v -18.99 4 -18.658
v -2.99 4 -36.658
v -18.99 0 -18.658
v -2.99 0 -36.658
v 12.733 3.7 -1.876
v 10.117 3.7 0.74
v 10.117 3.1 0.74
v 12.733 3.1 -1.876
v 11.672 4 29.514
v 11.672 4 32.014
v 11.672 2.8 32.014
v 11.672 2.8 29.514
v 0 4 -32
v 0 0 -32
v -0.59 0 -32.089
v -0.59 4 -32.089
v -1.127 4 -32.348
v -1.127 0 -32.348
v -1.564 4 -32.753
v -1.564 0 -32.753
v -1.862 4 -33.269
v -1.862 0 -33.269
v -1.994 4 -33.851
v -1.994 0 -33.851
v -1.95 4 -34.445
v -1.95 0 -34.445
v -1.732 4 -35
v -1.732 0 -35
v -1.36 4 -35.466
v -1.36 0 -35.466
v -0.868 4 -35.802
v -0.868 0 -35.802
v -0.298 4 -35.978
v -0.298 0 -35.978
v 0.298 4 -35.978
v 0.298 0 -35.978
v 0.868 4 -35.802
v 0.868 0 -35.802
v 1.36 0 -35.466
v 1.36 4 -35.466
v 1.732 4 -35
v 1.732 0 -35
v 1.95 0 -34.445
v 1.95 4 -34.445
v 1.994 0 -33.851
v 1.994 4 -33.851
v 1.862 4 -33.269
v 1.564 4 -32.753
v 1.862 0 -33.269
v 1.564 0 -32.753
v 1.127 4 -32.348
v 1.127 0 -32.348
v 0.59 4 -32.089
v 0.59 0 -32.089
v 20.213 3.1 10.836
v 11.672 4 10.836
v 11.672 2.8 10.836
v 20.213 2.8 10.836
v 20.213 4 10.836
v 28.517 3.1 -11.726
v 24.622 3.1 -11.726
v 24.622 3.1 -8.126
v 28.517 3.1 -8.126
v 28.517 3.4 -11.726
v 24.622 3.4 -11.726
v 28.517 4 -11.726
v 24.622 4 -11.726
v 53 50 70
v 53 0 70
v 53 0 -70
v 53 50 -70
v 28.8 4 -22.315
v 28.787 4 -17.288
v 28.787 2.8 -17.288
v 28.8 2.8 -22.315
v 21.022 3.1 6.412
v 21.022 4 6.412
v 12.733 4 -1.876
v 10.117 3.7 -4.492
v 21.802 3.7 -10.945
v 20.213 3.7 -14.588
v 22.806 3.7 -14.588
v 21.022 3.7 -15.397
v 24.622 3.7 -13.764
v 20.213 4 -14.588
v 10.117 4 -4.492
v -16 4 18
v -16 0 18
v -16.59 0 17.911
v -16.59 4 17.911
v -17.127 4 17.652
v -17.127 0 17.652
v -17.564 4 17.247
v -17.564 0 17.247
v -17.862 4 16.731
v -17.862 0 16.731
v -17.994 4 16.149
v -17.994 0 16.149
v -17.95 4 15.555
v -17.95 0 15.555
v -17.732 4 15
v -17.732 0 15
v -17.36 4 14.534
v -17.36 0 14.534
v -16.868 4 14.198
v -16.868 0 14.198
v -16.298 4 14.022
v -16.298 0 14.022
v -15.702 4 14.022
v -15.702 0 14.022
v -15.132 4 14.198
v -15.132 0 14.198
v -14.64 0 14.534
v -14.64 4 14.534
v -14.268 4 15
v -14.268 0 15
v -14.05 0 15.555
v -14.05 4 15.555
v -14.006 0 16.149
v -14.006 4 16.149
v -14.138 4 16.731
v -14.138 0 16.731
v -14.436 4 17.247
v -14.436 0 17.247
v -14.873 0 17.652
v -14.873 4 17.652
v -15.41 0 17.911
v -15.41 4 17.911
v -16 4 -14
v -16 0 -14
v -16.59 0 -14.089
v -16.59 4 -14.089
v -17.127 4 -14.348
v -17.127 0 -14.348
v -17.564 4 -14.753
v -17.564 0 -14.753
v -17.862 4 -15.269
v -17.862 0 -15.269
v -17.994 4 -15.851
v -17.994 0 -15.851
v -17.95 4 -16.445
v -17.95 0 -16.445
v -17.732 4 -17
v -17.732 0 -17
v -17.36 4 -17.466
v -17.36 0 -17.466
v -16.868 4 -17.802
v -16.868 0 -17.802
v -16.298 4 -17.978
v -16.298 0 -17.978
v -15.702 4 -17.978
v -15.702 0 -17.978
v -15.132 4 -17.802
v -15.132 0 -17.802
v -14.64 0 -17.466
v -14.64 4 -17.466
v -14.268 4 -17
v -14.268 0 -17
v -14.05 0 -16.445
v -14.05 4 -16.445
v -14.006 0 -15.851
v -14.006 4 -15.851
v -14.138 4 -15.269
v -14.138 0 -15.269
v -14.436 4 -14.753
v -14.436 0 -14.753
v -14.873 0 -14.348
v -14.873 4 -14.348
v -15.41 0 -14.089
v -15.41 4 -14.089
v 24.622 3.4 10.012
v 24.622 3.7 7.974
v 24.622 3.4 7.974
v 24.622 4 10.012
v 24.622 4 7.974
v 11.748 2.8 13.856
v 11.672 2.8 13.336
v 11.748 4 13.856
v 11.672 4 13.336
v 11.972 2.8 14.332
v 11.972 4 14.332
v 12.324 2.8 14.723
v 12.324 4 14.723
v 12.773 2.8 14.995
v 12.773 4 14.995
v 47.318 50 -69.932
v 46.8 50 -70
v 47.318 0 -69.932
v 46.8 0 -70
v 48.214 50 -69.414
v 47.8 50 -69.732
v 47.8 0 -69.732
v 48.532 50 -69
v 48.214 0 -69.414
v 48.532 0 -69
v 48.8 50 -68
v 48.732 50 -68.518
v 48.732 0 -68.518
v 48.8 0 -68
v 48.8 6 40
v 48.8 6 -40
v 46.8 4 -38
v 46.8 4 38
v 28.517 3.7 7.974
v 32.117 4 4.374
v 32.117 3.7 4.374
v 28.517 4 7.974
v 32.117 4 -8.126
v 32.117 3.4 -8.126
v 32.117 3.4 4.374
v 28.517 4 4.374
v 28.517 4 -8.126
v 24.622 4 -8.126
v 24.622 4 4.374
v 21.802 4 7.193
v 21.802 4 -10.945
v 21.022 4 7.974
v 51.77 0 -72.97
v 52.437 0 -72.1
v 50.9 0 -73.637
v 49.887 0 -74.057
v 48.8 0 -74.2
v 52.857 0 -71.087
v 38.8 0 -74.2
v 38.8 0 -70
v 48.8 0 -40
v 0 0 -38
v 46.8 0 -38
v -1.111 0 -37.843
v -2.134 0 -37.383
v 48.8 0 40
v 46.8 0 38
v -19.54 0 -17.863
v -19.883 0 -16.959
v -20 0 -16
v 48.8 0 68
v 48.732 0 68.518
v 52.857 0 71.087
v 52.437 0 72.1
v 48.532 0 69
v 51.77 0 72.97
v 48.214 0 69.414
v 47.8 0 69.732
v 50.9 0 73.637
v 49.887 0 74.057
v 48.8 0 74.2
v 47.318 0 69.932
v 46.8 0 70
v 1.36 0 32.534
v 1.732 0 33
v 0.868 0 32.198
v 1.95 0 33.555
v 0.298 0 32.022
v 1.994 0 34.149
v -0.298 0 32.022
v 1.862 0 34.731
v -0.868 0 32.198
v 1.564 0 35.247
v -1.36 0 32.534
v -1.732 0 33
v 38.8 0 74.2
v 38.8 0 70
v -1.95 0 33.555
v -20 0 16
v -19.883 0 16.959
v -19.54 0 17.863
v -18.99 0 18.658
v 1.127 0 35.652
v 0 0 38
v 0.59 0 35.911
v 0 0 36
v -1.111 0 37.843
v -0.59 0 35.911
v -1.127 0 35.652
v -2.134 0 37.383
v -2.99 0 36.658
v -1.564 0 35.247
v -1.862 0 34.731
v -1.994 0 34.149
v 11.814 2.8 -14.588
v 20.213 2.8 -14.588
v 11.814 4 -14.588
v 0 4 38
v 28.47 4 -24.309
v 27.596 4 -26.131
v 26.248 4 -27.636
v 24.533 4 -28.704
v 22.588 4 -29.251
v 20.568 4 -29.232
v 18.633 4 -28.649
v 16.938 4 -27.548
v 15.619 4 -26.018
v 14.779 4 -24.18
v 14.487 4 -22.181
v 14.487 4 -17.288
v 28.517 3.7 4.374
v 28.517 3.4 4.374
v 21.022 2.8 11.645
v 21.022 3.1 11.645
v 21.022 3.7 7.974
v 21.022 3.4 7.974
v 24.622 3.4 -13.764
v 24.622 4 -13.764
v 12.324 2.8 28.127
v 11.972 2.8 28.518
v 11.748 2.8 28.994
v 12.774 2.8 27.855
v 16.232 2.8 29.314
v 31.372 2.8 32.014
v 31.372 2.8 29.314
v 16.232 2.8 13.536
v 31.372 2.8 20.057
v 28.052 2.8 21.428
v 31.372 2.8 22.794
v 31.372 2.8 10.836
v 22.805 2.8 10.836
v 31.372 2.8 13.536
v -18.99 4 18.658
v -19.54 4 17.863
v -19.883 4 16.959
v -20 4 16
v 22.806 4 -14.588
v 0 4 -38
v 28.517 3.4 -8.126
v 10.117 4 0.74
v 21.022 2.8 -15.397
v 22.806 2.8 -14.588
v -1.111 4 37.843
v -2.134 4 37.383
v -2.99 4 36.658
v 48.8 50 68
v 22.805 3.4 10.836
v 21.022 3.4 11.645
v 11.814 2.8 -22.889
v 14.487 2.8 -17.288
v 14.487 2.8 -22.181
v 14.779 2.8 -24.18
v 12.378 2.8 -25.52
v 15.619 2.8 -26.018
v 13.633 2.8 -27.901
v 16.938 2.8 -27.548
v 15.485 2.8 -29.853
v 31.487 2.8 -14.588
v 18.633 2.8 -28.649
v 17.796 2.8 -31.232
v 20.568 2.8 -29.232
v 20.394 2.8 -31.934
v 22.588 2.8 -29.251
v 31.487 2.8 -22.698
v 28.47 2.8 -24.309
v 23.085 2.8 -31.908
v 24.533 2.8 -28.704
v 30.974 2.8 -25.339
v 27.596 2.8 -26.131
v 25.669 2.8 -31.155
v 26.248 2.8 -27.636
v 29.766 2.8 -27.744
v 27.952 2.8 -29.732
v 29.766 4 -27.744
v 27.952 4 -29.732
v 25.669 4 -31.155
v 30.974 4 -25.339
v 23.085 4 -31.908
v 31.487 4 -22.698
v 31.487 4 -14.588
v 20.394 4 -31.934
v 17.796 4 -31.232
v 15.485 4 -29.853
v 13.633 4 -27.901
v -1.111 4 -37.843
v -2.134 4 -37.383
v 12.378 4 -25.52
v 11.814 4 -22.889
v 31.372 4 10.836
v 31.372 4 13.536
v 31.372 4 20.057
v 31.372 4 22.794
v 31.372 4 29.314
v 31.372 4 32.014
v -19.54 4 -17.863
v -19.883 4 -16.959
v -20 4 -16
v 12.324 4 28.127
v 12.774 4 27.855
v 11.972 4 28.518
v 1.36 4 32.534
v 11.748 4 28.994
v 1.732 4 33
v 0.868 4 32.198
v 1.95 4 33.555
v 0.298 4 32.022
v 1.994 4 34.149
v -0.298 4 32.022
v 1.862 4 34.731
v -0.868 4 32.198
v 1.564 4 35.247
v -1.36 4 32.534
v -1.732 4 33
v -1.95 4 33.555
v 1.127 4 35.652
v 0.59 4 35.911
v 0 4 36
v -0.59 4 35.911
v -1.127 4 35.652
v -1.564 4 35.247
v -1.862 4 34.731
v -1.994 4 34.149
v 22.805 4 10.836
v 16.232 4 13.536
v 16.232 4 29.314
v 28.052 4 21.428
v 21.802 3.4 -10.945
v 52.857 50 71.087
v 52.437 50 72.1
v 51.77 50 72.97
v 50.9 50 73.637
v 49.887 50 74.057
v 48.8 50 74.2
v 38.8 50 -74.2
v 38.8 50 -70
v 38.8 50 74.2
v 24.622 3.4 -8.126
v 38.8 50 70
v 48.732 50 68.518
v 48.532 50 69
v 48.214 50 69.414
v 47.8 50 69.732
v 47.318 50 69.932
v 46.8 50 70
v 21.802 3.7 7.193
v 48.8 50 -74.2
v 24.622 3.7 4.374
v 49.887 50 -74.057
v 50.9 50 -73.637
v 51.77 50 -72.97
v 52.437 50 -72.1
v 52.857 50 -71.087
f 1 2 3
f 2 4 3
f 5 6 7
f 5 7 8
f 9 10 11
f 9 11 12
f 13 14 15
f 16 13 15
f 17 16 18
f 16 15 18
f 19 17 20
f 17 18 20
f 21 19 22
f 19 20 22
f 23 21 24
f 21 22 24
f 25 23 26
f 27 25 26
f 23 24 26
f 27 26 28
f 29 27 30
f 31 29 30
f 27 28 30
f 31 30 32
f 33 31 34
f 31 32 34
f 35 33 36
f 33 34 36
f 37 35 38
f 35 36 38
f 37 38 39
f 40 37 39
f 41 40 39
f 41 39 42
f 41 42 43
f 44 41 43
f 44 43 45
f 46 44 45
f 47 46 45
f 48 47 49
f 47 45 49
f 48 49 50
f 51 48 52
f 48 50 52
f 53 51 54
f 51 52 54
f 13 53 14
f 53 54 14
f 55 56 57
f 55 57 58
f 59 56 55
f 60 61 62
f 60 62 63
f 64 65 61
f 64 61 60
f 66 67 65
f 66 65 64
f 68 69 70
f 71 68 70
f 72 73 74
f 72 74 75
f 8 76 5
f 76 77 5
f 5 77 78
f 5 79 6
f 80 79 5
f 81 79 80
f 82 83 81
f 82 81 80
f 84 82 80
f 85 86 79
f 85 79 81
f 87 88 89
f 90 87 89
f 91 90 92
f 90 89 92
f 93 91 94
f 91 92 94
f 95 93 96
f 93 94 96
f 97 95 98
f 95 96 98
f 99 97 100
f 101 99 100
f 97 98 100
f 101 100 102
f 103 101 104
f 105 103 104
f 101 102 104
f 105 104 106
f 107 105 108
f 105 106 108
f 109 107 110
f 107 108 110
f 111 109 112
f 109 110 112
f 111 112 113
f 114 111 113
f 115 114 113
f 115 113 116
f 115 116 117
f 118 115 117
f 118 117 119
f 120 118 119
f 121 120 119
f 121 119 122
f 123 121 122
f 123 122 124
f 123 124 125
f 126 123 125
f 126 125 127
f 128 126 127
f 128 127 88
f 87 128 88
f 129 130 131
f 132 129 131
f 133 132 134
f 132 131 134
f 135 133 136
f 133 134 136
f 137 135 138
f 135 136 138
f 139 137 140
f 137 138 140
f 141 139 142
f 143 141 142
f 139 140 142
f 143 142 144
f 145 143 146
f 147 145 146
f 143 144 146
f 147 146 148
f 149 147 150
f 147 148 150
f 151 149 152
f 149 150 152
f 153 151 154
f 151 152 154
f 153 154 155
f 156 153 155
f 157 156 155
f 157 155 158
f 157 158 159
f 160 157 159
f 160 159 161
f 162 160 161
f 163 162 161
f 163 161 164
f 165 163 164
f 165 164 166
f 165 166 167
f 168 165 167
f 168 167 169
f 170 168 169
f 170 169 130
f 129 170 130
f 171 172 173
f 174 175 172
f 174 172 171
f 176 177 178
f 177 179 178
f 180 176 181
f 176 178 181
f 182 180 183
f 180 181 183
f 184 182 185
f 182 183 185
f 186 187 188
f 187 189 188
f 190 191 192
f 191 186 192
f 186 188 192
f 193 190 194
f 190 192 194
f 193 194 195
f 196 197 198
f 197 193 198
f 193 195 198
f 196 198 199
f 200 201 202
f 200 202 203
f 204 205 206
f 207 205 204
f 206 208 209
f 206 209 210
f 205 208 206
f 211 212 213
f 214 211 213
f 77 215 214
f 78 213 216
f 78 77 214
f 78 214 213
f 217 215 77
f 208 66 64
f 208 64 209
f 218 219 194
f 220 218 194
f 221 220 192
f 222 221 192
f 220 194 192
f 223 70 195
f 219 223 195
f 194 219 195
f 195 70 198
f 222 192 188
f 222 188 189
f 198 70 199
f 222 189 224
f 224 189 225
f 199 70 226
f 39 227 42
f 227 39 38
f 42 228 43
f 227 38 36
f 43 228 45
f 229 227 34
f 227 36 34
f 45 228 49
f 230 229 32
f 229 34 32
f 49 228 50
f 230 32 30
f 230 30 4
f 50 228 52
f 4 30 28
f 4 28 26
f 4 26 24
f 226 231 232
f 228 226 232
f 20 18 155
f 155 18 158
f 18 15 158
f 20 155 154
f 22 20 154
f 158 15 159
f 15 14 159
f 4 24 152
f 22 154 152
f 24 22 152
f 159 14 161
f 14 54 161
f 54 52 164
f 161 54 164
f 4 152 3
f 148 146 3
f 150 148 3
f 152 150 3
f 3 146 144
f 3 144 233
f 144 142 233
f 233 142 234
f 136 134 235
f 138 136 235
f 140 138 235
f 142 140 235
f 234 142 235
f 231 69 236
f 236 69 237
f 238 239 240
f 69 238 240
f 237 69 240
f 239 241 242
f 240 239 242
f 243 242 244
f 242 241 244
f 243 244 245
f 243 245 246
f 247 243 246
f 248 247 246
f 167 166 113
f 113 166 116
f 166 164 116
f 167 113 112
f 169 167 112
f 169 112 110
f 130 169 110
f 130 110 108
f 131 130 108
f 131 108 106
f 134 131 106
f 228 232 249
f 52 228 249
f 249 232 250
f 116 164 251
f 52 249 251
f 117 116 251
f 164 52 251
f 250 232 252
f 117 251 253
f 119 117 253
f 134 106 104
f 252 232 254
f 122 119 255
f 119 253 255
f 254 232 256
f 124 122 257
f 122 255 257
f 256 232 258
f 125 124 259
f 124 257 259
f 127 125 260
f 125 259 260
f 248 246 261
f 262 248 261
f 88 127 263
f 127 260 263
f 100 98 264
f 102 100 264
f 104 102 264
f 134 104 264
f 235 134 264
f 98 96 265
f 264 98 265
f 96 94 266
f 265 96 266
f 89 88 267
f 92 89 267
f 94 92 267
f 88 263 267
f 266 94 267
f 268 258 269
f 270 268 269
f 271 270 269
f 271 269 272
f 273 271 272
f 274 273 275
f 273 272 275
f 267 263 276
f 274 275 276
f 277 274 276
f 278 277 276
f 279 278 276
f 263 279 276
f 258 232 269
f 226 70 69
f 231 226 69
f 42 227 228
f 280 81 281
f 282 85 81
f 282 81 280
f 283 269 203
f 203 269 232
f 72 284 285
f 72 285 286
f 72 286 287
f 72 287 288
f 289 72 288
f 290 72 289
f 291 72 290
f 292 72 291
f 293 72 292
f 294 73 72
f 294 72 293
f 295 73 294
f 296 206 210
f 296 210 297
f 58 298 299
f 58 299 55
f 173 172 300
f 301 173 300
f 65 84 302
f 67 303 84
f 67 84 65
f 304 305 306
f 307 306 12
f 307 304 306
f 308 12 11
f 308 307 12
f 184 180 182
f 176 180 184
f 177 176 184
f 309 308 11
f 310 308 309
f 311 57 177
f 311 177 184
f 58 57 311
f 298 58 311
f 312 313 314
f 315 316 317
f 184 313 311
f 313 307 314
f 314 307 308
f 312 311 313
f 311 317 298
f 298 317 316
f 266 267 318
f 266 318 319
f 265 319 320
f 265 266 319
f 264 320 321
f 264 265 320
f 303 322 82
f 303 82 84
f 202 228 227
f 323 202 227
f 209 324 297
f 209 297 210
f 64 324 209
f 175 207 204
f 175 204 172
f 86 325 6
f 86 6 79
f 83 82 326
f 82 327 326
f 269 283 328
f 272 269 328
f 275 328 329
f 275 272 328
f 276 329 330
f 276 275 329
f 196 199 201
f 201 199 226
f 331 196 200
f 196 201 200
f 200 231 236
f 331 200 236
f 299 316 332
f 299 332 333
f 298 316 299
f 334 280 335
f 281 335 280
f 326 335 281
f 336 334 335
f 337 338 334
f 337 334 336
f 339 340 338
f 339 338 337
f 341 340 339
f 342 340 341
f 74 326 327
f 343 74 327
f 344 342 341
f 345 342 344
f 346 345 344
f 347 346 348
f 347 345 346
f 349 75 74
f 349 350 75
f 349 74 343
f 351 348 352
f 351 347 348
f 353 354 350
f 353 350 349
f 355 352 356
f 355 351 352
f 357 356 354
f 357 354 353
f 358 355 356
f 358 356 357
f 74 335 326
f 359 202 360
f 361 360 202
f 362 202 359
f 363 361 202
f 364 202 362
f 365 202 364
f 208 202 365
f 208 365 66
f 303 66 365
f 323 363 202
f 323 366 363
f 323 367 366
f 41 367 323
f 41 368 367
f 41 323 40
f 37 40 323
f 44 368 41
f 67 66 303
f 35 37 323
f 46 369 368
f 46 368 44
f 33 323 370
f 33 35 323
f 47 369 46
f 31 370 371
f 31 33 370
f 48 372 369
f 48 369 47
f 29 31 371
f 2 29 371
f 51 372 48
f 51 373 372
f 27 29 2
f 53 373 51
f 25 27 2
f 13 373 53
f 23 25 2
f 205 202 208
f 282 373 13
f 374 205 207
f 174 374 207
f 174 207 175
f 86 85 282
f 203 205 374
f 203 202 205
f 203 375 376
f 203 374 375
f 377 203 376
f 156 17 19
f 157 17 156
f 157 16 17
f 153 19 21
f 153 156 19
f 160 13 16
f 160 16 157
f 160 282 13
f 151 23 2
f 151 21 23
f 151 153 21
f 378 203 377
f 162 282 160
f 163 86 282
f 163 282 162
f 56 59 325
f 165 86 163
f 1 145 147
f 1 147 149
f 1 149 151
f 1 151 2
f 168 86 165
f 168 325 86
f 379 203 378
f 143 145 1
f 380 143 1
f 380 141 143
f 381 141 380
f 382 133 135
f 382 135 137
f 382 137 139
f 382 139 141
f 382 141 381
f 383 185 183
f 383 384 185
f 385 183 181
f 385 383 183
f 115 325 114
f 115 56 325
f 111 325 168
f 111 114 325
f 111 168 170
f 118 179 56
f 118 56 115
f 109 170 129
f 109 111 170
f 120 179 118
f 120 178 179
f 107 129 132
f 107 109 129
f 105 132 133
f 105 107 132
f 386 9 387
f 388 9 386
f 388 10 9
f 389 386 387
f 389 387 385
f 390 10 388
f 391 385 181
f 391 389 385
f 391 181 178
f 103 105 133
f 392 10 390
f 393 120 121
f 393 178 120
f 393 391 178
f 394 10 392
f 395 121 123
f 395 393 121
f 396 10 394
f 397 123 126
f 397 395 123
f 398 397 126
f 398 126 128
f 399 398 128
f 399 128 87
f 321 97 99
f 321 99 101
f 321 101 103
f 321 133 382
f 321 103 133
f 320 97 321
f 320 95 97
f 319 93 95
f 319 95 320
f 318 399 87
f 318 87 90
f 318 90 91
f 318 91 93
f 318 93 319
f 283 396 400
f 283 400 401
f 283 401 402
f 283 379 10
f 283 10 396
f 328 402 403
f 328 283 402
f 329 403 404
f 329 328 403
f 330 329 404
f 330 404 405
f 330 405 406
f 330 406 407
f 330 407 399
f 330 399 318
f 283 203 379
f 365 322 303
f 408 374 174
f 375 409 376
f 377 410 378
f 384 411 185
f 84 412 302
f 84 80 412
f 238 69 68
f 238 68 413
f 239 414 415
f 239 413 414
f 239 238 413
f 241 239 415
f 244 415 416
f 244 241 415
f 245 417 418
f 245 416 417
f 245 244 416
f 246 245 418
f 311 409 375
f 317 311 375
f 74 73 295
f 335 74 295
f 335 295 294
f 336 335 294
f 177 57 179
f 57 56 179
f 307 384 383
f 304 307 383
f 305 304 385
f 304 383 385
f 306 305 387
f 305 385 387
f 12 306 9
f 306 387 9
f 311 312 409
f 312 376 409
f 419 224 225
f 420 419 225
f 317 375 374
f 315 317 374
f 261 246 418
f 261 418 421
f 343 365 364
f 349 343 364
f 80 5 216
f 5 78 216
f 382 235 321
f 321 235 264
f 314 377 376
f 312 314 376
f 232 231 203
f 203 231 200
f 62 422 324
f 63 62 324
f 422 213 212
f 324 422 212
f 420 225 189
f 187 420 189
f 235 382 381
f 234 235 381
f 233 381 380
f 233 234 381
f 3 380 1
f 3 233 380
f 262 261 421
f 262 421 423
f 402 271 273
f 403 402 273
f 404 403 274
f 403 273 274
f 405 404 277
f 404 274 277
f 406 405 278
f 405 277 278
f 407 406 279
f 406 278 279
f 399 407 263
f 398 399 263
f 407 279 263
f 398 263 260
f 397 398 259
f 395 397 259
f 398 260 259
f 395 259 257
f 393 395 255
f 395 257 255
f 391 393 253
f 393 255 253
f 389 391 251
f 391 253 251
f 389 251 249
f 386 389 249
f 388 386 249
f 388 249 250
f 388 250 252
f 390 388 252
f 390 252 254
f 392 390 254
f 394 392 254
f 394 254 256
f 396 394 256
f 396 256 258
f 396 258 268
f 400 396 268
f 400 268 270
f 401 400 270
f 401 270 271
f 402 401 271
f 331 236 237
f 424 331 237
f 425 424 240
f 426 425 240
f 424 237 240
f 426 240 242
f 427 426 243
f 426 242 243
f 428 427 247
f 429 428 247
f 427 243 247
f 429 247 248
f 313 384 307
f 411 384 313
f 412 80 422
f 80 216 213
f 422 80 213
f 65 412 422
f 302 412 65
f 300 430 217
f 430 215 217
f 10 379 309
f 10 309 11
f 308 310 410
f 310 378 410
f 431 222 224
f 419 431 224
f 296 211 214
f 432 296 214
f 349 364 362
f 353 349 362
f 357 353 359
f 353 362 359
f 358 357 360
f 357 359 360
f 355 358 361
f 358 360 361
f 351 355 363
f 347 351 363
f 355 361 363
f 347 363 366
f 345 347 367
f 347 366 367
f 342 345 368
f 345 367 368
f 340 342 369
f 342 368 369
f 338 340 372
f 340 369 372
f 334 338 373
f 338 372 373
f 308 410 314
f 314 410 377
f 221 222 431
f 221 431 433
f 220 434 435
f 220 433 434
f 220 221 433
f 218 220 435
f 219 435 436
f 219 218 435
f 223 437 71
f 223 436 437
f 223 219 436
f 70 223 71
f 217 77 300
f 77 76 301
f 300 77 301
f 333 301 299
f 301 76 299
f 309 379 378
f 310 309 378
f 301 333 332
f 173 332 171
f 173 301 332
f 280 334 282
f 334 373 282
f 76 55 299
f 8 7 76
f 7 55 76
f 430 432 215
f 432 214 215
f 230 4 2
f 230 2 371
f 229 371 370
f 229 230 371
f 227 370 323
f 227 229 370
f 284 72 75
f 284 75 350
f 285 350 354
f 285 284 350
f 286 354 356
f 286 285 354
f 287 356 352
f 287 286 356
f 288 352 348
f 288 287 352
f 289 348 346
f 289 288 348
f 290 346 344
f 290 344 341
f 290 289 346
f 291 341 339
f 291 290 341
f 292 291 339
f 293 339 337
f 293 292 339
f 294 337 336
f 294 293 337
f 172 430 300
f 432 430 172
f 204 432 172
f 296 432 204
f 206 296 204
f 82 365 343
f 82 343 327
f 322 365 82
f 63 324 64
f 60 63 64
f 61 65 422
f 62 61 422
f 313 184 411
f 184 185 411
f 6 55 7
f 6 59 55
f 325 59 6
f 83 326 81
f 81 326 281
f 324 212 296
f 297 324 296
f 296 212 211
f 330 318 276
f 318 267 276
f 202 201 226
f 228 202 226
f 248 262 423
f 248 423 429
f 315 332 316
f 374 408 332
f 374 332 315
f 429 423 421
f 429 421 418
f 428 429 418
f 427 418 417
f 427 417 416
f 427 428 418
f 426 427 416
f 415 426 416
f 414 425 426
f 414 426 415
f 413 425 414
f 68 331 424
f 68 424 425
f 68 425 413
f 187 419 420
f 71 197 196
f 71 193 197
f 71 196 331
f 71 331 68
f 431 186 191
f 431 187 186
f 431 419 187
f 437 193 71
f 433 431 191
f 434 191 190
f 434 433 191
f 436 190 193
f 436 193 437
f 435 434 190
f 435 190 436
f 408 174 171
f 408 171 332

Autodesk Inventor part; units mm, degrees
ref_plane "YZ Plane" through (0, 0, 0) normal (1, 0, 0) x (0, 1, 0)
ref_plane "XZ Plane" through (0, 0, 0) normal (0, 1, 0) x (-1, 0, 0)
ref_plane "XY Plane" through (0, 0, 0) normal (0, 0, 1) x (1, 0, 0)
sketch "Sketch1" plane through (0, 0, 0) normal (0, 1, 0) x (-1, 0, 0)
  line L0 (0, 34) -> (16, 16) construction
  line L1 (18.9896, 18.6575) -> (2.9896, 36.6575)
  arc A0 (2.9896, 36.6575) -> (0, 38) centre (0, 34) ccw
  arc A1 (20, 16) -> (18.9896, 18.6575) centre (16, 16) ccw
  line L2 (16, 16) -> (16, -16) construction
  line L3 (20, -16) -> (20, 16)
  line L4 (16, -16) -> (0, -34) construction
  line L5 (2.9896, -36.6575) -> (18.9896, -18.6575)
  line L6 (0, 34) -> (-44.6053, 34) construction
  line L7 (0, 38) -> (-53, 38)
  line L8 (0, -34) -> (-49, -34) construction
  line L9 (-53, -38) -> (0, -38)
  line L10 (-49, 30.0008) -> (-49, -29.9992) construction
  line L11 (-53, 38) -> (-53, -38)
  arc A2 (18.9896, -18.6575) -> (20, -16) centre (16, -16) ccw
  arc A3 (0, -38) -> (2.9896, -36.6575) centre (0, -34) ccw
  point P0 (0, 0)
  point P1 (8, 25)
  point P2 (16, 0)
  point P3 (8, -25)
  point P4 (-24.1053, 34)
  point P5 (-24.5, -34)
  point P6 (-49, 0.0008)
  dimension "d1" = 34
  dimension "d2" = 32
  dimension "d3" = 16
  dimension "d4" = 16
  dimension "d6" = 8
  dimension "d12" = 4
  dimension "d13" = 4
  dimension "d15" = 4
  dimension "d17" = 68
  dimension "d18" = 76
  dimension "d19" = 73
  dimension "d21" = 20
  dimension "d40" = 76
  dimension "d41" = 53
extrude "Extrusion1" add sketch "Sketch1" along normal blind 4
sketch "Sketch2" plane through (0, 4, 0) normal (0, 1, 0) x (1, 0, 0)
  line L0 (-20, 16) -> (-20, -16) projected
  point P0 (0, 0)
  point P1 (0, -34)
  point P2 (-16, 16)
  point P3 (-16, -16)
  point P4 (0, 34)
  dimension "d31" = 34
  dimension "d33" = 20
  dimension "d34" = 16
  dimension "d35" = 4
  dimension "d36" = 16
  dimension "d37" = 4
  dimension "d38" = 20
  dimension "d39" = 34
hole "Hole1" at (0, 4, 34) at (-16, 4, -16) at (-16, 4, 16) at (0, 4, -34) direction (0, -1, 0) diameter 4 end through all
sketch "Sketch3" plane through (0, 4, 0) normal (0, 1, 0) x (1, 0, 0)
  line L0 (53, -70) -> (53, 70)
  line L1 (48.8, 70) -> (48.8, -70)
  line L2 (53, -38) -> (53, 38) projected
  arc A0 (53, 70) -> (48.8, 74.2) centre (48.8, 70) ccw
  arc A1 (48.8, -74.2) -> (53, -70) centre (48.8, -70) ccw
  line L3 (48.8, 74.2) -> (38.8, 74.2)
  line L4 (38.8, 74.2) -> (38.8, 70)
  line L5 (38.8, 70) -> (48.8, 70)
  line L6 (48.8, -74.2) -> (38.8, -74.2)
  line L7 (38.8, -74.2) -> (38.8, -70)
  line L8 (38.8, -70) -> (48.8, -70)
  point P0 (0, 0)
  dimension "d42" = 140
  dimension "d43" = 4.2
  dimension "d52" = 70
  dimension "d53" = 10
  dimension "d54" = 10
extrude "Extrusion2" add sketch "Sketch3" along normal blind 46 and the other way blind 4
chamfer "Chamfer1" distance 2 angle 45 3 edges at (48.8, 4, 0) (48.8, 2, 38) (48.8, 2, -38)
fillet "Fillet1" radius 2 1 edges at (48.8, 25, 70)
fillet "Fillet2" radius 2 1 edges at (48.8, 25, -70)
sketch "Sketch9" plane through (0, 4, 0) normal (0, 1, 0) x (1, 0, 0)
  line L0 (21.0218, -11.6451) -> (10.117, -0.7403)
  line L1 (10.117, -0.7403) -> (10.117, 4.4923)
  line L2 (10.117, 4.4923) -> (21.0218, 15.3971)
  line L3 (21.0218, 15.3971) -> (24.6218, 13.7645)
  line L4 (24.6218, 13.7645) -> (24.6218, 11.726)
  line L5 (24.6218, 11.726) -> (28.517, 11.726)
  line L6 (28.517, 11.726) -> (32.117, 8.126)
  line L7 (32.117, 8.126) -> (32.117, -4.374)
  line L8 (32.117, -4.374) -> (28.517, -7.974)
  line L9 (28.517, -7.974) -> (24.6218, -7.974)
  line L10 (24.6218, -7.974) -> (24.6218, -10.0125)
  line L11 (24.6218, -10.0125) -> (21.0218, -11.6451)
  line L12 (28.517, -4.374) -> (24.6218, -4.374)
  line L13 (24.6218, -4.374) -> (21.8025, -7.1932)
  line L14 (21.8025, -7.1932) -> (12.7333, 1.876)
  line L15 (12.7333, 1.876) -> (21.8025, 10.9453)
  line L16 (21.8025, 10.9453) -> (24.6218, 8.126)
  line L17 (24.6218, 8.126) -> (28.517, 8.126)
  line L18 (28.517, 8.126) -> (28.517, -4.374)
  line L19 (10.117, -0.7403) -> (24.6218, 13.7645)
  line L20 (24.6218, -10.0125) -> (10.117, 4.4923)
  line L21 (21.8025, -7.1932) -> (21.8025, 10.9453)
  line L22 (21.0218, -11.6451) -> (21.0218, 15.3971)
  line L23 (24.6218, -7.974) -> (21.0218, -7.974)
  line L24 (21.8025, -7.1932) -> (21.0218, -7.974)
  line L25 (32.117, -4.374) -> (28.517, -4.374)
  line L26 (32.117, 8.126) -> (28.517, 8.126)
  line L27 (24.6218, 11.726) -> (24.6218, 8.126)
  line L28 (28.517, 8.126) -> (28.517, 11.726)
  line L29 (21.0218, -7.974) -> (24.6218, -7.974)
  line L30 (21.8025, -7.1932) -> (21.0218, -7.974)
  line L31 (21.0218, -11.6451) -> (21.0218, -7.974)
  line L32 (12.7333, 1.876) -> (10.117, -0.7403)
  line L33 (21.8025, 10.9453) -> (24.6218, 13.7645)
  line L34 (28.517, -4.374) -> (32.117, -4.374)
  line L35 (0, -38) -> (46.8, -38) projected
  point P0 (-70, 0)
  point P1 (21.0218, -6.4125)
  dimension "d467" = 3.7
  dimension "d468" = 3.7
  dimension "d469" = 12.5
  dimension "d470" = 3.6
  dimension "d471" = 3.6
  dimension "d472" = 2.0385
  dimension "d473" = 3.6
  dimension "d474" = 22
  dimension "d475" = 3.6
  dimension "d523" = 30.026
extrude "Extrusion16" cut sketch "Sketch9" against normal blind 0.6 contours L22 L23 L20 L11 | L20 L23 L10 | L19 L4 L27 L16 | L25 L18 L26 L7 | L26 L28 L6
extrude "Extrusion19" cut sketch "Sketch9" against normal blind 0.3 contours L1 L20 L19 | L24 L20 L23 | L2 L22 L15 L20 | L23 L20 L13 L12 L25 L8 L9 | L3 L19 L15 L22
sketch "Sketch10" plane through (0, 4, 0) normal (0, 1, 0) x (1, 0, 0)
  line L0 (31.4873, 14.588) -> (11.8138, 14.588)
  line L1 (31.4873, 14.588) -> (31.4873, 22.6975)
  line L2 (11.8138, 22.8893) -> (11.8138, 14.588)
  line L3 (28.7873, 17.288) -> (28.7996, 22.3152)
  line L4 (28.7873, 17.288) -> (14.4873, 17.288)
  line L5 (14.4873, 17.288) -> (14.4873, 22.181)
  arc A0 (31.4873, 22.6975) -> (11.8138, 22.8893) centre (21.6443, 22.1561) ccw
  arc A1 (28.7996, 22.3152) -> (14.4873, 22.181) centre (21.6443, 22.1561) ccw
  line L6 (0, -38) -> (46.8, -38) projected
  line L7 (46.8, 38) -> (0, 38) projected
  dimension "d493" = 7.157
  dimension "d494" = 9.8579
  dimension "d495" = 2.7
  dimension "d496" = 2.6736
  dimension "d497" = 5.0272
  dimension "d498" = 19.6735
  dimension "d499" = 8.3013
  dimension "d500" = 14.3
  dimension "d520" = 19.6735
  dimension "d521" = 4.8929
  dimension "d522" = 5.986
sketch "Sketch11" plane through (0, 4, 0) normal (0, 1, 0) x (1, 0, 0)
  line L0 (16.2315, -29.314) -> (31.3715, -22.7937)
  line L1 (31.3715, -22.7937) -> (31.3715, -20.0566)
  line L2 (31.3715, -20.0566) -> (16.2315, -13.5363)
  line L3 (16.2315, -13.5363) -> (12.1356, -13.5363)
  line L4 (16.2315, -13.5363) -> (31.3715, -13.5363)
  line L5 (11.6715, -10.8363) -> (11.6715, -13.3363)
  arc A0 (12.7735, -27.8548) -> (11.6715, -29.514) centre (13.4715, -29.514) ccw
  arc A1 (11.6715, -13.3363) -> (12.773, -14.9953) centre (13.4715, -13.3363) ccw
  line L6 (12.7735, -27.8548) -> (28.0515, -21.4275)
  line L7 (12.773, -14.9953) -> (28.0515, -21.4275)
  line L8 (31.3715, -32.014) -> (11.6715, -32.014)
  line L9 (11.6715, -32.014) -> (11.6715, -29.514)
  line L10 (11.6715, -10.8363) -> (31.3715, -10.8363)
  line L11 (31.3715, -13.5363) -> (31.3715, -10.8363)
  line L12 (31.3715, -29.314) -> (16.2315, -29.314)
  line L13 (31.3715, -32.014) -> (31.3715, -29.314)
  line L14 (0, -38) -> (46.8, -38) projected
  line L15 (-20, 16) -> (-20, -16) projected
  point P0 (12.0472, -15.3794)
  dimension "d501" = 1.8
  dimension "d502" = 1.8
  dimension "d503" = 2.5
  dimension "d504" = 2.5
  dimension "d505" = 19.7
  dimension "d506" = 1.102
  dimension "d507" = 1.1016
  dimension "d509" = 15.14
  dimension "d510" = 3.32
  dimension "d511" = 2.7
  dimension "d513" = 23.3
  dimension "d514" = 23.3
  dimension "d516" = 5.986
  dimension "d517" = 19.7
  dimension "d518" = 15.14
  dimension "d519" = 31.6715
extrude "Extrusion21" cut sketch "Sketch10" against normal blind 1.2
extrude "Extrusion22" cut sketch "Sketch11" against normal blind 1.2
extrude "Extrusion23" cut sketch "Sketch9" against normal blind 0.9 contours L0 L19 L14 L22 | L27 L5 L28 L17
sketch "Sketch12" plane through (0, 2.8, 0) normal (0, 1, 0) x (1, 0, 0)
  line L0 (21.0218, -10.8363) -> (20.2129, -10.8363) projected
  line L1 (24.6218, -10.0125) -> (22.8052, -10.8363) projected
  line L2 (20.2129, -10.8363) -> (22.8052, -10.8363)
  line L3 (22.8052, -10.8363) -> (21.0218, -11.6451)
  line L4 (21.0218, -11.6451) -> (20.2129, -10.8363)
  line L5 (21.0218, -10.8363) -> (21.0218, -7.974) projected
  line L6 (21.0218, -10.8363) -> (21.0218, -11.6451)
  line L7 (21.0218, -6.4125) -> (21.0218, -7.974) projected
  line L8 (31.4873, 14.588) -> (11.8138, 14.588) projected
  line L9 (20.2127, 14.588) -> (22.8059, 14.588)
  line L10 (21.0218, 15.3971) -> (20.2127, 14.588)
  line L11 (22.8059, 14.588) -> (21.0218, 15.3971)
  line L12 (10.117, 4.4923) -> (20.2127, 14.588) projected
  line L13 (22.8059, 14.588) -> (24.6218, 13.7645) projected
  point P0 (0, 0)
extrude "Extrusion24" add sketch "Sketch12" along normal blind 0.9 contours L8 L10 L11
extrude "Extrusion25" add sketch "Sketch12" along normal blind 0.3 contours L6 L4 L0
extrude "Extrusion26" add sketch "Sketch12" along normal blind 0.6 contours L2 L3 L6
properties part number "pare_choc_demo_reel"
